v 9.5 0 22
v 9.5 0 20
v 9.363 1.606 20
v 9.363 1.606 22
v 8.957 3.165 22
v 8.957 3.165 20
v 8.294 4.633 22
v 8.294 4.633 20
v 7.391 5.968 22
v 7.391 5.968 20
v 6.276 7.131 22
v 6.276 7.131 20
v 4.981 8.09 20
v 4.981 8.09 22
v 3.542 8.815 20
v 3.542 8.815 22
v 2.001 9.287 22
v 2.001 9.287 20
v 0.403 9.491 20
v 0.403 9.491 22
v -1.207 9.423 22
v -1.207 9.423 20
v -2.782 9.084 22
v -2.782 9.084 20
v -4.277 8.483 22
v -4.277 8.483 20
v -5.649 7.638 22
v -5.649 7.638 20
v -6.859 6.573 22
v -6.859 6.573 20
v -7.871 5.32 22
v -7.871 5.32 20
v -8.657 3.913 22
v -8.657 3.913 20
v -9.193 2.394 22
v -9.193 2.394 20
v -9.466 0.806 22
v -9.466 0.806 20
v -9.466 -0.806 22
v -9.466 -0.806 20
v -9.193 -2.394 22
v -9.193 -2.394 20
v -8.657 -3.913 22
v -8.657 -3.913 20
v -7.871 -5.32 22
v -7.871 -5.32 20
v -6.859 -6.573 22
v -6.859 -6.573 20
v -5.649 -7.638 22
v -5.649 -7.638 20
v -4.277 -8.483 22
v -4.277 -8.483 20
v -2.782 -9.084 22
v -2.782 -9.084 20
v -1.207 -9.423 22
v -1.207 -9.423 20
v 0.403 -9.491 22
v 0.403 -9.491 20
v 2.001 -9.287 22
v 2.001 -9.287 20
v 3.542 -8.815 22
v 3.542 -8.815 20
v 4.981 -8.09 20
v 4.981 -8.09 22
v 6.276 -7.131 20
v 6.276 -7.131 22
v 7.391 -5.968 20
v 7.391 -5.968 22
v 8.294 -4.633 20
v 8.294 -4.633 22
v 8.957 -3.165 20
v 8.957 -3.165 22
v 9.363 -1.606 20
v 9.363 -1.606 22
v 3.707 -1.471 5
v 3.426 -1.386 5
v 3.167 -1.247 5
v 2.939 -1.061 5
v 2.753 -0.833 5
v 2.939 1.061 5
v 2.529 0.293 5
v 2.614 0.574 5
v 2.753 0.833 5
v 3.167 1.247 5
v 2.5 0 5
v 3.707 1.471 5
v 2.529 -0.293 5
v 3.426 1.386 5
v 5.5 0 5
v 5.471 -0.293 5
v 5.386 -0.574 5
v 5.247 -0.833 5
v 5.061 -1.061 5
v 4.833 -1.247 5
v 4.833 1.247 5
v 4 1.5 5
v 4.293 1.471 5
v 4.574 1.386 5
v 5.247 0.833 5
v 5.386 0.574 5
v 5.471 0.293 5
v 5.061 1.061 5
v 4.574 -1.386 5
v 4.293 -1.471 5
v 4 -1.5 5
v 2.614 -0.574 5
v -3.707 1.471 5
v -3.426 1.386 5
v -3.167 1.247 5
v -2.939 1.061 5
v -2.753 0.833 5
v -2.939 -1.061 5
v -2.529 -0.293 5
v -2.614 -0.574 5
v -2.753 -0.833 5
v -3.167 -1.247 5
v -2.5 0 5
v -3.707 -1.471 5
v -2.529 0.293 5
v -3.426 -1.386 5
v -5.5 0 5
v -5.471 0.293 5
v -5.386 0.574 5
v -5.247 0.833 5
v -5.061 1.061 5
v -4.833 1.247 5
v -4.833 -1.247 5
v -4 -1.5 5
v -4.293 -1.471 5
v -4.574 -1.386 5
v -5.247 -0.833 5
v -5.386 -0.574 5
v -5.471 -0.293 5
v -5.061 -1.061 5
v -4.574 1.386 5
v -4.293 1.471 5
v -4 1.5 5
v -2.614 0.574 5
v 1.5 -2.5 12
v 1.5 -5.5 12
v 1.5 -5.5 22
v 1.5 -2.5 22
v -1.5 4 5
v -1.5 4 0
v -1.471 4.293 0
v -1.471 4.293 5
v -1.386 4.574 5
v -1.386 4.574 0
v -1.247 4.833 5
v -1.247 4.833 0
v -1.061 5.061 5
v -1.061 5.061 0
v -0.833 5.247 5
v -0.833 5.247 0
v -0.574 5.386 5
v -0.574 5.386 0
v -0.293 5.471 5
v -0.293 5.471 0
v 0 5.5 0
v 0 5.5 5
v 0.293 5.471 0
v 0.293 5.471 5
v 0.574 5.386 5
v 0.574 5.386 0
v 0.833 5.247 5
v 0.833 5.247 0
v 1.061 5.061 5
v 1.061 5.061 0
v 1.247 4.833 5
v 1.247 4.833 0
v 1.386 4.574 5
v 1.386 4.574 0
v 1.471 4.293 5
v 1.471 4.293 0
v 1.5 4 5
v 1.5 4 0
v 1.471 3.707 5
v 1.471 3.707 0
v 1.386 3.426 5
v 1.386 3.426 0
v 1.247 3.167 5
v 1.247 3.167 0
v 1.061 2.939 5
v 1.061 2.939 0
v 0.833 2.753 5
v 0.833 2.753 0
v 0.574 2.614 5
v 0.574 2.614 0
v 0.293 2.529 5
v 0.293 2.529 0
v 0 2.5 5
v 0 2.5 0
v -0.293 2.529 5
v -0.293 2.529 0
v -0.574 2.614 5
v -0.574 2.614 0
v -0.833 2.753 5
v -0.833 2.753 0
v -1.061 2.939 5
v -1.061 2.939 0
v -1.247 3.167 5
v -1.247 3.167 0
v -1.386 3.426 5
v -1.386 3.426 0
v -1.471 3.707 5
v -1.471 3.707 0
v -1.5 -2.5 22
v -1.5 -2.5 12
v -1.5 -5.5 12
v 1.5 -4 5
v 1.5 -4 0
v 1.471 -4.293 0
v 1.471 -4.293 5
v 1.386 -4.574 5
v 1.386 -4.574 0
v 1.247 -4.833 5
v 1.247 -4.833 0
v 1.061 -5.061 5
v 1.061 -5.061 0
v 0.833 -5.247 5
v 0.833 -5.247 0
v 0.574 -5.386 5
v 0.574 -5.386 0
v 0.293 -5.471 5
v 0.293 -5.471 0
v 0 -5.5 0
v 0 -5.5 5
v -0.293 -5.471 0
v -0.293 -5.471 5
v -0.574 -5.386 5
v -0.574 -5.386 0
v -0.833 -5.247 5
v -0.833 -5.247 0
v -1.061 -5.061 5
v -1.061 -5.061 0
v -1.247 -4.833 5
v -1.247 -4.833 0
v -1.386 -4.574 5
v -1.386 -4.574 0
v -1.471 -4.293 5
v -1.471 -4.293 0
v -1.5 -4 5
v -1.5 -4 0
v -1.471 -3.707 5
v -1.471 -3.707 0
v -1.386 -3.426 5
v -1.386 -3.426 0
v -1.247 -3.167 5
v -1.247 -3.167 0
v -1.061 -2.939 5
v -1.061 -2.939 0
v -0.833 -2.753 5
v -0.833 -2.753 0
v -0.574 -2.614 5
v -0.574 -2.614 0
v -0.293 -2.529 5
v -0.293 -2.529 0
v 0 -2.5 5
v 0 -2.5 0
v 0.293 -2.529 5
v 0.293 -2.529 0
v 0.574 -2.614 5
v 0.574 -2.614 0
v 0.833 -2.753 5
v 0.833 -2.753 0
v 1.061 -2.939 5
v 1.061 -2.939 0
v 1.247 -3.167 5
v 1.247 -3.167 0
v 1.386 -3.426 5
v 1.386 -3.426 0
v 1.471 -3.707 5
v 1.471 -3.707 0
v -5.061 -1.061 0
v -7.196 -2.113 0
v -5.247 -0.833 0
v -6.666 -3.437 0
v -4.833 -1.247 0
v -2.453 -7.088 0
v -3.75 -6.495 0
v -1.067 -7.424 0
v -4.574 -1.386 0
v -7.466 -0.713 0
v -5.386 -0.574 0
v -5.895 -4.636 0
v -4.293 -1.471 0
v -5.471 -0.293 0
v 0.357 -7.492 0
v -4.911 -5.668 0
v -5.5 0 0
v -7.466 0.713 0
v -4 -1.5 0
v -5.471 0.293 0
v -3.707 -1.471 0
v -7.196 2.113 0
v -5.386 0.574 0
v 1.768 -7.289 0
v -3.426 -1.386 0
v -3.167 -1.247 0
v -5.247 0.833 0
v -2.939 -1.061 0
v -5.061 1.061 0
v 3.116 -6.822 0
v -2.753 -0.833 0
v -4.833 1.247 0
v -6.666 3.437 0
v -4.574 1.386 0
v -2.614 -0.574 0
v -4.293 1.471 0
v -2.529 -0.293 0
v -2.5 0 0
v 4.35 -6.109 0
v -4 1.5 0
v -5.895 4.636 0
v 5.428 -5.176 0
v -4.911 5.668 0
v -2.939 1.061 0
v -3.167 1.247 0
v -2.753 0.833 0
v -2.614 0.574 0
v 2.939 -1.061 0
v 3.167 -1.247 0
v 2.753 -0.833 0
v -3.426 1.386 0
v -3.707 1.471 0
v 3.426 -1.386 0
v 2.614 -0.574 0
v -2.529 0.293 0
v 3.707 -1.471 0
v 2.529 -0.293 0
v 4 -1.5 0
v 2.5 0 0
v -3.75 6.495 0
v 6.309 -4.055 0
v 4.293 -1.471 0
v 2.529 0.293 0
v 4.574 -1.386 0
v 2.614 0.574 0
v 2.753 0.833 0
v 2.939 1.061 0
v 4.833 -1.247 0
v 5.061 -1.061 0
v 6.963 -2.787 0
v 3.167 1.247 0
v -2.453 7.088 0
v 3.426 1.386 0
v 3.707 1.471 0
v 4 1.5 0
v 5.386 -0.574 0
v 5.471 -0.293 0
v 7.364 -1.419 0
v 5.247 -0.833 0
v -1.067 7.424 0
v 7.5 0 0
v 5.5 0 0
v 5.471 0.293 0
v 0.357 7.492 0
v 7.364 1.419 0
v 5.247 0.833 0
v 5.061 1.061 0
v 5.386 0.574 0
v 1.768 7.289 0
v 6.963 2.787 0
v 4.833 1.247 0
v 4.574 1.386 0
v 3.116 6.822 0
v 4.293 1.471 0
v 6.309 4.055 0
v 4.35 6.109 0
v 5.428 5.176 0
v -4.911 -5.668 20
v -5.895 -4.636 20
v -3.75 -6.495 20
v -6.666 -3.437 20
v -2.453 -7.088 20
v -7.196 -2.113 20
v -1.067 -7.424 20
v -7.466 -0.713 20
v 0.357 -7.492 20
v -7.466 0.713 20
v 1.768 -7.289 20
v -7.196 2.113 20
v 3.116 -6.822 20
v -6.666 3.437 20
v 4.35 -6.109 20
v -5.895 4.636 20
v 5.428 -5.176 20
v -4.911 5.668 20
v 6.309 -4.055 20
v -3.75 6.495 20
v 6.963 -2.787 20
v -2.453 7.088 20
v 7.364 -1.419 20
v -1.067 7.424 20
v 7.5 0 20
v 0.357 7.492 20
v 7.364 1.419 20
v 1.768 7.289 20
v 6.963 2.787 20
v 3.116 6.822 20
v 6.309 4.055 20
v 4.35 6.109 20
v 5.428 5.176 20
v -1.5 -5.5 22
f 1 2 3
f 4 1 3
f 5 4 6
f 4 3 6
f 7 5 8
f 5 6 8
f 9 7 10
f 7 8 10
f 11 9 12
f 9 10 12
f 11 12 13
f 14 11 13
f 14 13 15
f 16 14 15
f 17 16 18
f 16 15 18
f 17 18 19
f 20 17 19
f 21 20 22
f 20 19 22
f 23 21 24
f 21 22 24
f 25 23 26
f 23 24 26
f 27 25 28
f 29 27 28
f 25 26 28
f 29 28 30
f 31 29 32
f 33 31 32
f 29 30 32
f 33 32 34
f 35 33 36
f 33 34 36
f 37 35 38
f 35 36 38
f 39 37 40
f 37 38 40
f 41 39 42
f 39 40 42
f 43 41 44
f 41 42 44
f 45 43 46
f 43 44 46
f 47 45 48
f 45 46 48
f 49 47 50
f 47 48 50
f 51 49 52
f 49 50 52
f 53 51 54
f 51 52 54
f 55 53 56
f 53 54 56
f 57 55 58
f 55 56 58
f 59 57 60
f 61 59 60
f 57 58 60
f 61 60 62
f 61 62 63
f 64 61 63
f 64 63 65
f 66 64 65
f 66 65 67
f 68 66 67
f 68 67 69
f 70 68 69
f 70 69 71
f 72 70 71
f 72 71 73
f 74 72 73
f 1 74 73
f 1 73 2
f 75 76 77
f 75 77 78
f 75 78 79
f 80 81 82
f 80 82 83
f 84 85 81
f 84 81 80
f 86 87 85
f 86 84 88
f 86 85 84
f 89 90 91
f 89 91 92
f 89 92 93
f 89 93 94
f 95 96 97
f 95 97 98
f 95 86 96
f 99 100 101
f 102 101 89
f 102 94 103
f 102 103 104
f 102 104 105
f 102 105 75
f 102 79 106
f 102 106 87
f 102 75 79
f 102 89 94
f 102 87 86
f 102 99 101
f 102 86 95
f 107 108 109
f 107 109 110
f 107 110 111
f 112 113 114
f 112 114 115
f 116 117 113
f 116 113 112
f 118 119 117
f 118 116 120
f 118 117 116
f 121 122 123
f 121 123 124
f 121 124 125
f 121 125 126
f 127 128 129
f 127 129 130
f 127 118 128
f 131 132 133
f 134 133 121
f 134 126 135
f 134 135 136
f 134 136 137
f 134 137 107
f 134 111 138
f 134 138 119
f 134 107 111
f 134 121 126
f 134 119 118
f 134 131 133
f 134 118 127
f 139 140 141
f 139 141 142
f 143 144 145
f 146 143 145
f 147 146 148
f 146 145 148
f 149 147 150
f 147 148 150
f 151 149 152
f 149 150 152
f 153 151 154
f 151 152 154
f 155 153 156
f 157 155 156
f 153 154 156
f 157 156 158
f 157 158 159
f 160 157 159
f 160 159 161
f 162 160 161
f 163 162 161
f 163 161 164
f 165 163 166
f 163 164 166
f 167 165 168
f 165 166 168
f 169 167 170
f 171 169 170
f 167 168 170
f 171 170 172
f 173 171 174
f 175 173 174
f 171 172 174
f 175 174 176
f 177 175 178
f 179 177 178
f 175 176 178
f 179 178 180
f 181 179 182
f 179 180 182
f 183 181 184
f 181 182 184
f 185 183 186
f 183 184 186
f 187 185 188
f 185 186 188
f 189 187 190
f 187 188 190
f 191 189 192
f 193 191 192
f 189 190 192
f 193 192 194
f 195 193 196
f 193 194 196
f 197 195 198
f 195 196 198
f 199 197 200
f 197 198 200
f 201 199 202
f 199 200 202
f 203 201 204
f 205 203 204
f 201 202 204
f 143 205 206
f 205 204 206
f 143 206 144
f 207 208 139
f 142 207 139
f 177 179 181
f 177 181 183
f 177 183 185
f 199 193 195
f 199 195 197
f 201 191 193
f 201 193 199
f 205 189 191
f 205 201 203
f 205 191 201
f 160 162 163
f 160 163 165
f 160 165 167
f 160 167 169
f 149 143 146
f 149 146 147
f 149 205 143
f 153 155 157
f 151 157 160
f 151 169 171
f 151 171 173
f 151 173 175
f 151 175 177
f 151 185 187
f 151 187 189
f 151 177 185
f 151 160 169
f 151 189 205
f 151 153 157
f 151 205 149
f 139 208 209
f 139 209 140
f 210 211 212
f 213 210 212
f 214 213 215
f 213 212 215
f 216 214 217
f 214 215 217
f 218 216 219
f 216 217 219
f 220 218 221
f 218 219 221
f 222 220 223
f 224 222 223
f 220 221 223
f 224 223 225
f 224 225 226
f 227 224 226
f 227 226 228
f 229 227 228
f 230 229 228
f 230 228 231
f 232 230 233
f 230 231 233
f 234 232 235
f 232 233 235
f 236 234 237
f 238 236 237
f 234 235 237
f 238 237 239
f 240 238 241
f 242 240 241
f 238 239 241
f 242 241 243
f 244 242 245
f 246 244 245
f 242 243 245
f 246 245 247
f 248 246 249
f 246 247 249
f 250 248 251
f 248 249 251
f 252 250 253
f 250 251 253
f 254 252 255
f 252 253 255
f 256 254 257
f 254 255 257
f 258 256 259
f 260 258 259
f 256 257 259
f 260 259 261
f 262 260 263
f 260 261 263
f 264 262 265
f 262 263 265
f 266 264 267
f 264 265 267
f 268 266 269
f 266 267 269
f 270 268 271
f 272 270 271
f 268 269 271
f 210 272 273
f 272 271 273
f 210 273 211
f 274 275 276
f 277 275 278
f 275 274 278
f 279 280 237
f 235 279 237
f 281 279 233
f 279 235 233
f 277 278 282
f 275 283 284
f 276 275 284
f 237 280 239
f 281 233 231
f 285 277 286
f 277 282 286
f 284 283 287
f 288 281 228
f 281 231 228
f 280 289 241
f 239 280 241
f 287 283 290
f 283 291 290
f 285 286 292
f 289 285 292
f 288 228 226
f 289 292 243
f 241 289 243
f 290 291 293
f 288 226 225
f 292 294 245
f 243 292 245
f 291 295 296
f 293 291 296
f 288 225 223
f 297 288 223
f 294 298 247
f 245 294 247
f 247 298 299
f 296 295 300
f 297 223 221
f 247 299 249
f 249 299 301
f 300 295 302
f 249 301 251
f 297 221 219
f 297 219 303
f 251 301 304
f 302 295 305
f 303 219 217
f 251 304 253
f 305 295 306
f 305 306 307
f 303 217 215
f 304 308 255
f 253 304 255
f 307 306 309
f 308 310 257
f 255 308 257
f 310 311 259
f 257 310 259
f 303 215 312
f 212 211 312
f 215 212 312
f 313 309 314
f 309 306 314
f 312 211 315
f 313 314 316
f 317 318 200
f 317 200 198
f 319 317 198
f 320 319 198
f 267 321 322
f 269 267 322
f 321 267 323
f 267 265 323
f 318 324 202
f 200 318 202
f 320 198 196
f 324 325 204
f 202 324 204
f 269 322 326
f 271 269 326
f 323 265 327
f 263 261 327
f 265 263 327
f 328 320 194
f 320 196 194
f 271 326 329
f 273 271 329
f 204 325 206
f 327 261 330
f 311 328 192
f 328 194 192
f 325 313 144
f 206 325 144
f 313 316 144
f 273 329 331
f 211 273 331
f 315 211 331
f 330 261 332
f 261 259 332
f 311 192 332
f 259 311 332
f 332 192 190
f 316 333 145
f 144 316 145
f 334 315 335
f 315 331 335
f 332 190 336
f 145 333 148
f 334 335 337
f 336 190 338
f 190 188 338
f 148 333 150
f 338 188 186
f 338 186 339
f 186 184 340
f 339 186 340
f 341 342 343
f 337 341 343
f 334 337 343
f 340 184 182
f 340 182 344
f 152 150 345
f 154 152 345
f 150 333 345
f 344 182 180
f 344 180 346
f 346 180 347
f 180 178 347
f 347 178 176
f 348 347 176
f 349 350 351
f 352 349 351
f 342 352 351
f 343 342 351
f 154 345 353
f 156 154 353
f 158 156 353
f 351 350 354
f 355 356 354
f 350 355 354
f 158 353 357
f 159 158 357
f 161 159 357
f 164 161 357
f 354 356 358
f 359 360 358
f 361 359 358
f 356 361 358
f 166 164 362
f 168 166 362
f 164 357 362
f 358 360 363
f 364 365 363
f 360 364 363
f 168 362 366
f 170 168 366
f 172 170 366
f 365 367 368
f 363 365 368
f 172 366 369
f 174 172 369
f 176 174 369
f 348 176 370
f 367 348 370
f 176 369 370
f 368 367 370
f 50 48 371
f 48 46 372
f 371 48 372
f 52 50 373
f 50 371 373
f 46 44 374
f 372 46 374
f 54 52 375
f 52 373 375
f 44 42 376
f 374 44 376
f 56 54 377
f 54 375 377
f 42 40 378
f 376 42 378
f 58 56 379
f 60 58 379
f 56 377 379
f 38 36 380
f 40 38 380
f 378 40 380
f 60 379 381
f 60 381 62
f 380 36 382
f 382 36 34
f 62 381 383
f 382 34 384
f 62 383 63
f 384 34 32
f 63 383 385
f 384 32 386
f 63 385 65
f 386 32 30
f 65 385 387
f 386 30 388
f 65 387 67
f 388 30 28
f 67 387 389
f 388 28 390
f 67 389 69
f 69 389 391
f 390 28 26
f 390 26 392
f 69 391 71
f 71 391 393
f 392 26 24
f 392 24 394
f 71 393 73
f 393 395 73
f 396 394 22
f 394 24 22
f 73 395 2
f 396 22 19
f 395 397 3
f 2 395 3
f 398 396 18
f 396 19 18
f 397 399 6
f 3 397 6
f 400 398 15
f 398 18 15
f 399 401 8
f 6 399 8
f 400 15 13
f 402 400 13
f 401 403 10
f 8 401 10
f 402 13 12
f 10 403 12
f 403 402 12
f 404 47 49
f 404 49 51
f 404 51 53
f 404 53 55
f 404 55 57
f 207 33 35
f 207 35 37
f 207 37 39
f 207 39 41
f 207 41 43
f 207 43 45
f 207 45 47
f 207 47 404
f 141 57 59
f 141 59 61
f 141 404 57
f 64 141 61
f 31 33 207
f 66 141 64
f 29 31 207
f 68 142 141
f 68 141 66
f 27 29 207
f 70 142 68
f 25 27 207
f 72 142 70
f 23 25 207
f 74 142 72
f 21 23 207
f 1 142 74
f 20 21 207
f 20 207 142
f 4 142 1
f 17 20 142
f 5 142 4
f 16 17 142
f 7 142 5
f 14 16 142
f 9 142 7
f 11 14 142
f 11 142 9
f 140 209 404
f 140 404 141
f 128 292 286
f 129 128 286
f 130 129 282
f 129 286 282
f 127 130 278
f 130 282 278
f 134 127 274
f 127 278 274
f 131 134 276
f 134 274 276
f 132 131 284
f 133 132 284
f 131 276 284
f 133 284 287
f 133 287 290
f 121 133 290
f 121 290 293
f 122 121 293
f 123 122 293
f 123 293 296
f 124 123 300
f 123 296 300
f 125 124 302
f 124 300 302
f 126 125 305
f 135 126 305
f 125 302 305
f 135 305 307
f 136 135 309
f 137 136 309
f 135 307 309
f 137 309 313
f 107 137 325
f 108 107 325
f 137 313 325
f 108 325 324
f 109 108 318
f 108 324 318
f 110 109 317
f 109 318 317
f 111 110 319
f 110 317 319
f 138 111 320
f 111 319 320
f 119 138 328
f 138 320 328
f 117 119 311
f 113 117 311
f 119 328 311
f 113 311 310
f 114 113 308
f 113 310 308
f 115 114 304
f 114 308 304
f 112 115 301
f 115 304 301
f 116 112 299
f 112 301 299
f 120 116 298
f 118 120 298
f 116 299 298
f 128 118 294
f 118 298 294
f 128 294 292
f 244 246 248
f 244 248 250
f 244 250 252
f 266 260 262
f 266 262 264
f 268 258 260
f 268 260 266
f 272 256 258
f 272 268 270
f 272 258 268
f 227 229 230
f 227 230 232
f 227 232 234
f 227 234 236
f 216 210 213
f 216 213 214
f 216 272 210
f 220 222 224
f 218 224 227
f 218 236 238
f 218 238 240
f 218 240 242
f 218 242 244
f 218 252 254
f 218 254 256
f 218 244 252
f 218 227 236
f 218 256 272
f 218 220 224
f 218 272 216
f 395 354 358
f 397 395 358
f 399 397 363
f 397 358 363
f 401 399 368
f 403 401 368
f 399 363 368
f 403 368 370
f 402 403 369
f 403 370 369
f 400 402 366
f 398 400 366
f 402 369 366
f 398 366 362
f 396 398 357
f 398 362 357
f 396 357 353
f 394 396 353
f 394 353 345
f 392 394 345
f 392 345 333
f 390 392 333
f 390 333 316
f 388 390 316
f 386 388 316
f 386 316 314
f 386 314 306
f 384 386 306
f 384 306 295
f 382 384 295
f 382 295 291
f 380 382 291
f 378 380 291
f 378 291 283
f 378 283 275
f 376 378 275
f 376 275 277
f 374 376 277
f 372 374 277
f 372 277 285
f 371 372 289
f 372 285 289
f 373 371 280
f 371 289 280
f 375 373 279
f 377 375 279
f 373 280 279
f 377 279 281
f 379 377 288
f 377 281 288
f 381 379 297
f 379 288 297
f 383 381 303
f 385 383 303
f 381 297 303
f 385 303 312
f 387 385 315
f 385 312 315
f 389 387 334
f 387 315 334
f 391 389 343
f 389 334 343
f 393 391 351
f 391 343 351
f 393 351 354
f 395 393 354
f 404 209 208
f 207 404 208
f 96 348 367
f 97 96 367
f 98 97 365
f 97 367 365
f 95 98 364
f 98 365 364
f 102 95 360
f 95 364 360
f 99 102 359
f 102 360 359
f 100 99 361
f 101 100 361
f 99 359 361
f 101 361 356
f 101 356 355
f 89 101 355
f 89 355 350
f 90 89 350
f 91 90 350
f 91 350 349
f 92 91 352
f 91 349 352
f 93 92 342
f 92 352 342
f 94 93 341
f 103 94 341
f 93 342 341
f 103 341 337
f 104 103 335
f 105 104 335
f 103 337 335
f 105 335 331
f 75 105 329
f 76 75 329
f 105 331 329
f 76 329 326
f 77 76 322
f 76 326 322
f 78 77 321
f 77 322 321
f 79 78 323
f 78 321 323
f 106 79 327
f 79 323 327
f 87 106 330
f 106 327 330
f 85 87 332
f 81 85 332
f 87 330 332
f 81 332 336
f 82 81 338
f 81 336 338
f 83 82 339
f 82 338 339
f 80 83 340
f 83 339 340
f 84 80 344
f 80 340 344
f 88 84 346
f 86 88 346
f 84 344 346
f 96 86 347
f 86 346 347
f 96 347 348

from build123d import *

# Parameters (mm, degrees)
SKETCH1_R           = 7.5
BOSS_EXTRUDE1_DEPTH = 22
SKETCH4_W           = 3
SKETCH4_H           = 3
CUT_EXTRUDE1_DEPTH  = 10
SKETCH5_R           = 1.5
CUT_EXTRUDE2_DEPTH  = 5
CIRPATTERN1_COUNT   = 4
BOSS_EXTRUDE2_START = -2
SKETCH6_R           = 9.5
SKETCH6_R_2         = 7.5
BOSS_EXTRUDE2_DEPTH = 2


with BuildPart() as part:
    # Sketch1 → Boss-Extrude1 (new body)
    with BuildSketch(Plane.XY):
        Circle(SKETCH1_R)
    extrude(amount=BOSS_EXTRUDE1_DEPTH)

    # Sketch4 → Cut-Extrude1 (cut)
    with BuildSketch(Plane.XY.offset(22)):
        with Locations((0, -4)):
            Rectangle(SKETCH4_W, SKETCH4_H)
    extrude(amount=-CUT_EXTRUDE1_DEPTH, mode=Mode.SUBTRACT)

    # Sketch5 → Cut-Extrude2 (cut)
    with BuildSketch(Plane(origin=(0, 0, 0), x_dir=(-1, 0, 0), z_dir=(0, 0, -1))):
        with Locations((0, 4)):
            Circle(SKETCH5_R)
    cut_extrude2 = extrude(amount=-CUT_EXTRUDE2_DEPTH, mode=Mode.SUBTRACT)

    # CirPattern1: Cut-Extrude2 ×4 about axis
    cirpattern1_axis = Axis((0, 0, 0), (0, 0, 1))
    for i in range(1, CIRPATTERN1_COUNT):
        add(cut_extrude2.rotate(cirpattern1_axis, i * 360 / CIRPATTERN1_COUNT), mode=Mode.SUBTRACT)

    # Sketch6 → Boss-Extrude2 (add)
    with BuildSketch(Plane.XY.offset(22).offset(BOSS_EXTRUDE2_START)):
        Circle(SKETCH6_R)
        Circle(SKETCH6_R_2, mode=Mode.SUBTRACT)
    extrude(amount=BOSS_EXTRUDE2_DEPTH)


solid = part.part
